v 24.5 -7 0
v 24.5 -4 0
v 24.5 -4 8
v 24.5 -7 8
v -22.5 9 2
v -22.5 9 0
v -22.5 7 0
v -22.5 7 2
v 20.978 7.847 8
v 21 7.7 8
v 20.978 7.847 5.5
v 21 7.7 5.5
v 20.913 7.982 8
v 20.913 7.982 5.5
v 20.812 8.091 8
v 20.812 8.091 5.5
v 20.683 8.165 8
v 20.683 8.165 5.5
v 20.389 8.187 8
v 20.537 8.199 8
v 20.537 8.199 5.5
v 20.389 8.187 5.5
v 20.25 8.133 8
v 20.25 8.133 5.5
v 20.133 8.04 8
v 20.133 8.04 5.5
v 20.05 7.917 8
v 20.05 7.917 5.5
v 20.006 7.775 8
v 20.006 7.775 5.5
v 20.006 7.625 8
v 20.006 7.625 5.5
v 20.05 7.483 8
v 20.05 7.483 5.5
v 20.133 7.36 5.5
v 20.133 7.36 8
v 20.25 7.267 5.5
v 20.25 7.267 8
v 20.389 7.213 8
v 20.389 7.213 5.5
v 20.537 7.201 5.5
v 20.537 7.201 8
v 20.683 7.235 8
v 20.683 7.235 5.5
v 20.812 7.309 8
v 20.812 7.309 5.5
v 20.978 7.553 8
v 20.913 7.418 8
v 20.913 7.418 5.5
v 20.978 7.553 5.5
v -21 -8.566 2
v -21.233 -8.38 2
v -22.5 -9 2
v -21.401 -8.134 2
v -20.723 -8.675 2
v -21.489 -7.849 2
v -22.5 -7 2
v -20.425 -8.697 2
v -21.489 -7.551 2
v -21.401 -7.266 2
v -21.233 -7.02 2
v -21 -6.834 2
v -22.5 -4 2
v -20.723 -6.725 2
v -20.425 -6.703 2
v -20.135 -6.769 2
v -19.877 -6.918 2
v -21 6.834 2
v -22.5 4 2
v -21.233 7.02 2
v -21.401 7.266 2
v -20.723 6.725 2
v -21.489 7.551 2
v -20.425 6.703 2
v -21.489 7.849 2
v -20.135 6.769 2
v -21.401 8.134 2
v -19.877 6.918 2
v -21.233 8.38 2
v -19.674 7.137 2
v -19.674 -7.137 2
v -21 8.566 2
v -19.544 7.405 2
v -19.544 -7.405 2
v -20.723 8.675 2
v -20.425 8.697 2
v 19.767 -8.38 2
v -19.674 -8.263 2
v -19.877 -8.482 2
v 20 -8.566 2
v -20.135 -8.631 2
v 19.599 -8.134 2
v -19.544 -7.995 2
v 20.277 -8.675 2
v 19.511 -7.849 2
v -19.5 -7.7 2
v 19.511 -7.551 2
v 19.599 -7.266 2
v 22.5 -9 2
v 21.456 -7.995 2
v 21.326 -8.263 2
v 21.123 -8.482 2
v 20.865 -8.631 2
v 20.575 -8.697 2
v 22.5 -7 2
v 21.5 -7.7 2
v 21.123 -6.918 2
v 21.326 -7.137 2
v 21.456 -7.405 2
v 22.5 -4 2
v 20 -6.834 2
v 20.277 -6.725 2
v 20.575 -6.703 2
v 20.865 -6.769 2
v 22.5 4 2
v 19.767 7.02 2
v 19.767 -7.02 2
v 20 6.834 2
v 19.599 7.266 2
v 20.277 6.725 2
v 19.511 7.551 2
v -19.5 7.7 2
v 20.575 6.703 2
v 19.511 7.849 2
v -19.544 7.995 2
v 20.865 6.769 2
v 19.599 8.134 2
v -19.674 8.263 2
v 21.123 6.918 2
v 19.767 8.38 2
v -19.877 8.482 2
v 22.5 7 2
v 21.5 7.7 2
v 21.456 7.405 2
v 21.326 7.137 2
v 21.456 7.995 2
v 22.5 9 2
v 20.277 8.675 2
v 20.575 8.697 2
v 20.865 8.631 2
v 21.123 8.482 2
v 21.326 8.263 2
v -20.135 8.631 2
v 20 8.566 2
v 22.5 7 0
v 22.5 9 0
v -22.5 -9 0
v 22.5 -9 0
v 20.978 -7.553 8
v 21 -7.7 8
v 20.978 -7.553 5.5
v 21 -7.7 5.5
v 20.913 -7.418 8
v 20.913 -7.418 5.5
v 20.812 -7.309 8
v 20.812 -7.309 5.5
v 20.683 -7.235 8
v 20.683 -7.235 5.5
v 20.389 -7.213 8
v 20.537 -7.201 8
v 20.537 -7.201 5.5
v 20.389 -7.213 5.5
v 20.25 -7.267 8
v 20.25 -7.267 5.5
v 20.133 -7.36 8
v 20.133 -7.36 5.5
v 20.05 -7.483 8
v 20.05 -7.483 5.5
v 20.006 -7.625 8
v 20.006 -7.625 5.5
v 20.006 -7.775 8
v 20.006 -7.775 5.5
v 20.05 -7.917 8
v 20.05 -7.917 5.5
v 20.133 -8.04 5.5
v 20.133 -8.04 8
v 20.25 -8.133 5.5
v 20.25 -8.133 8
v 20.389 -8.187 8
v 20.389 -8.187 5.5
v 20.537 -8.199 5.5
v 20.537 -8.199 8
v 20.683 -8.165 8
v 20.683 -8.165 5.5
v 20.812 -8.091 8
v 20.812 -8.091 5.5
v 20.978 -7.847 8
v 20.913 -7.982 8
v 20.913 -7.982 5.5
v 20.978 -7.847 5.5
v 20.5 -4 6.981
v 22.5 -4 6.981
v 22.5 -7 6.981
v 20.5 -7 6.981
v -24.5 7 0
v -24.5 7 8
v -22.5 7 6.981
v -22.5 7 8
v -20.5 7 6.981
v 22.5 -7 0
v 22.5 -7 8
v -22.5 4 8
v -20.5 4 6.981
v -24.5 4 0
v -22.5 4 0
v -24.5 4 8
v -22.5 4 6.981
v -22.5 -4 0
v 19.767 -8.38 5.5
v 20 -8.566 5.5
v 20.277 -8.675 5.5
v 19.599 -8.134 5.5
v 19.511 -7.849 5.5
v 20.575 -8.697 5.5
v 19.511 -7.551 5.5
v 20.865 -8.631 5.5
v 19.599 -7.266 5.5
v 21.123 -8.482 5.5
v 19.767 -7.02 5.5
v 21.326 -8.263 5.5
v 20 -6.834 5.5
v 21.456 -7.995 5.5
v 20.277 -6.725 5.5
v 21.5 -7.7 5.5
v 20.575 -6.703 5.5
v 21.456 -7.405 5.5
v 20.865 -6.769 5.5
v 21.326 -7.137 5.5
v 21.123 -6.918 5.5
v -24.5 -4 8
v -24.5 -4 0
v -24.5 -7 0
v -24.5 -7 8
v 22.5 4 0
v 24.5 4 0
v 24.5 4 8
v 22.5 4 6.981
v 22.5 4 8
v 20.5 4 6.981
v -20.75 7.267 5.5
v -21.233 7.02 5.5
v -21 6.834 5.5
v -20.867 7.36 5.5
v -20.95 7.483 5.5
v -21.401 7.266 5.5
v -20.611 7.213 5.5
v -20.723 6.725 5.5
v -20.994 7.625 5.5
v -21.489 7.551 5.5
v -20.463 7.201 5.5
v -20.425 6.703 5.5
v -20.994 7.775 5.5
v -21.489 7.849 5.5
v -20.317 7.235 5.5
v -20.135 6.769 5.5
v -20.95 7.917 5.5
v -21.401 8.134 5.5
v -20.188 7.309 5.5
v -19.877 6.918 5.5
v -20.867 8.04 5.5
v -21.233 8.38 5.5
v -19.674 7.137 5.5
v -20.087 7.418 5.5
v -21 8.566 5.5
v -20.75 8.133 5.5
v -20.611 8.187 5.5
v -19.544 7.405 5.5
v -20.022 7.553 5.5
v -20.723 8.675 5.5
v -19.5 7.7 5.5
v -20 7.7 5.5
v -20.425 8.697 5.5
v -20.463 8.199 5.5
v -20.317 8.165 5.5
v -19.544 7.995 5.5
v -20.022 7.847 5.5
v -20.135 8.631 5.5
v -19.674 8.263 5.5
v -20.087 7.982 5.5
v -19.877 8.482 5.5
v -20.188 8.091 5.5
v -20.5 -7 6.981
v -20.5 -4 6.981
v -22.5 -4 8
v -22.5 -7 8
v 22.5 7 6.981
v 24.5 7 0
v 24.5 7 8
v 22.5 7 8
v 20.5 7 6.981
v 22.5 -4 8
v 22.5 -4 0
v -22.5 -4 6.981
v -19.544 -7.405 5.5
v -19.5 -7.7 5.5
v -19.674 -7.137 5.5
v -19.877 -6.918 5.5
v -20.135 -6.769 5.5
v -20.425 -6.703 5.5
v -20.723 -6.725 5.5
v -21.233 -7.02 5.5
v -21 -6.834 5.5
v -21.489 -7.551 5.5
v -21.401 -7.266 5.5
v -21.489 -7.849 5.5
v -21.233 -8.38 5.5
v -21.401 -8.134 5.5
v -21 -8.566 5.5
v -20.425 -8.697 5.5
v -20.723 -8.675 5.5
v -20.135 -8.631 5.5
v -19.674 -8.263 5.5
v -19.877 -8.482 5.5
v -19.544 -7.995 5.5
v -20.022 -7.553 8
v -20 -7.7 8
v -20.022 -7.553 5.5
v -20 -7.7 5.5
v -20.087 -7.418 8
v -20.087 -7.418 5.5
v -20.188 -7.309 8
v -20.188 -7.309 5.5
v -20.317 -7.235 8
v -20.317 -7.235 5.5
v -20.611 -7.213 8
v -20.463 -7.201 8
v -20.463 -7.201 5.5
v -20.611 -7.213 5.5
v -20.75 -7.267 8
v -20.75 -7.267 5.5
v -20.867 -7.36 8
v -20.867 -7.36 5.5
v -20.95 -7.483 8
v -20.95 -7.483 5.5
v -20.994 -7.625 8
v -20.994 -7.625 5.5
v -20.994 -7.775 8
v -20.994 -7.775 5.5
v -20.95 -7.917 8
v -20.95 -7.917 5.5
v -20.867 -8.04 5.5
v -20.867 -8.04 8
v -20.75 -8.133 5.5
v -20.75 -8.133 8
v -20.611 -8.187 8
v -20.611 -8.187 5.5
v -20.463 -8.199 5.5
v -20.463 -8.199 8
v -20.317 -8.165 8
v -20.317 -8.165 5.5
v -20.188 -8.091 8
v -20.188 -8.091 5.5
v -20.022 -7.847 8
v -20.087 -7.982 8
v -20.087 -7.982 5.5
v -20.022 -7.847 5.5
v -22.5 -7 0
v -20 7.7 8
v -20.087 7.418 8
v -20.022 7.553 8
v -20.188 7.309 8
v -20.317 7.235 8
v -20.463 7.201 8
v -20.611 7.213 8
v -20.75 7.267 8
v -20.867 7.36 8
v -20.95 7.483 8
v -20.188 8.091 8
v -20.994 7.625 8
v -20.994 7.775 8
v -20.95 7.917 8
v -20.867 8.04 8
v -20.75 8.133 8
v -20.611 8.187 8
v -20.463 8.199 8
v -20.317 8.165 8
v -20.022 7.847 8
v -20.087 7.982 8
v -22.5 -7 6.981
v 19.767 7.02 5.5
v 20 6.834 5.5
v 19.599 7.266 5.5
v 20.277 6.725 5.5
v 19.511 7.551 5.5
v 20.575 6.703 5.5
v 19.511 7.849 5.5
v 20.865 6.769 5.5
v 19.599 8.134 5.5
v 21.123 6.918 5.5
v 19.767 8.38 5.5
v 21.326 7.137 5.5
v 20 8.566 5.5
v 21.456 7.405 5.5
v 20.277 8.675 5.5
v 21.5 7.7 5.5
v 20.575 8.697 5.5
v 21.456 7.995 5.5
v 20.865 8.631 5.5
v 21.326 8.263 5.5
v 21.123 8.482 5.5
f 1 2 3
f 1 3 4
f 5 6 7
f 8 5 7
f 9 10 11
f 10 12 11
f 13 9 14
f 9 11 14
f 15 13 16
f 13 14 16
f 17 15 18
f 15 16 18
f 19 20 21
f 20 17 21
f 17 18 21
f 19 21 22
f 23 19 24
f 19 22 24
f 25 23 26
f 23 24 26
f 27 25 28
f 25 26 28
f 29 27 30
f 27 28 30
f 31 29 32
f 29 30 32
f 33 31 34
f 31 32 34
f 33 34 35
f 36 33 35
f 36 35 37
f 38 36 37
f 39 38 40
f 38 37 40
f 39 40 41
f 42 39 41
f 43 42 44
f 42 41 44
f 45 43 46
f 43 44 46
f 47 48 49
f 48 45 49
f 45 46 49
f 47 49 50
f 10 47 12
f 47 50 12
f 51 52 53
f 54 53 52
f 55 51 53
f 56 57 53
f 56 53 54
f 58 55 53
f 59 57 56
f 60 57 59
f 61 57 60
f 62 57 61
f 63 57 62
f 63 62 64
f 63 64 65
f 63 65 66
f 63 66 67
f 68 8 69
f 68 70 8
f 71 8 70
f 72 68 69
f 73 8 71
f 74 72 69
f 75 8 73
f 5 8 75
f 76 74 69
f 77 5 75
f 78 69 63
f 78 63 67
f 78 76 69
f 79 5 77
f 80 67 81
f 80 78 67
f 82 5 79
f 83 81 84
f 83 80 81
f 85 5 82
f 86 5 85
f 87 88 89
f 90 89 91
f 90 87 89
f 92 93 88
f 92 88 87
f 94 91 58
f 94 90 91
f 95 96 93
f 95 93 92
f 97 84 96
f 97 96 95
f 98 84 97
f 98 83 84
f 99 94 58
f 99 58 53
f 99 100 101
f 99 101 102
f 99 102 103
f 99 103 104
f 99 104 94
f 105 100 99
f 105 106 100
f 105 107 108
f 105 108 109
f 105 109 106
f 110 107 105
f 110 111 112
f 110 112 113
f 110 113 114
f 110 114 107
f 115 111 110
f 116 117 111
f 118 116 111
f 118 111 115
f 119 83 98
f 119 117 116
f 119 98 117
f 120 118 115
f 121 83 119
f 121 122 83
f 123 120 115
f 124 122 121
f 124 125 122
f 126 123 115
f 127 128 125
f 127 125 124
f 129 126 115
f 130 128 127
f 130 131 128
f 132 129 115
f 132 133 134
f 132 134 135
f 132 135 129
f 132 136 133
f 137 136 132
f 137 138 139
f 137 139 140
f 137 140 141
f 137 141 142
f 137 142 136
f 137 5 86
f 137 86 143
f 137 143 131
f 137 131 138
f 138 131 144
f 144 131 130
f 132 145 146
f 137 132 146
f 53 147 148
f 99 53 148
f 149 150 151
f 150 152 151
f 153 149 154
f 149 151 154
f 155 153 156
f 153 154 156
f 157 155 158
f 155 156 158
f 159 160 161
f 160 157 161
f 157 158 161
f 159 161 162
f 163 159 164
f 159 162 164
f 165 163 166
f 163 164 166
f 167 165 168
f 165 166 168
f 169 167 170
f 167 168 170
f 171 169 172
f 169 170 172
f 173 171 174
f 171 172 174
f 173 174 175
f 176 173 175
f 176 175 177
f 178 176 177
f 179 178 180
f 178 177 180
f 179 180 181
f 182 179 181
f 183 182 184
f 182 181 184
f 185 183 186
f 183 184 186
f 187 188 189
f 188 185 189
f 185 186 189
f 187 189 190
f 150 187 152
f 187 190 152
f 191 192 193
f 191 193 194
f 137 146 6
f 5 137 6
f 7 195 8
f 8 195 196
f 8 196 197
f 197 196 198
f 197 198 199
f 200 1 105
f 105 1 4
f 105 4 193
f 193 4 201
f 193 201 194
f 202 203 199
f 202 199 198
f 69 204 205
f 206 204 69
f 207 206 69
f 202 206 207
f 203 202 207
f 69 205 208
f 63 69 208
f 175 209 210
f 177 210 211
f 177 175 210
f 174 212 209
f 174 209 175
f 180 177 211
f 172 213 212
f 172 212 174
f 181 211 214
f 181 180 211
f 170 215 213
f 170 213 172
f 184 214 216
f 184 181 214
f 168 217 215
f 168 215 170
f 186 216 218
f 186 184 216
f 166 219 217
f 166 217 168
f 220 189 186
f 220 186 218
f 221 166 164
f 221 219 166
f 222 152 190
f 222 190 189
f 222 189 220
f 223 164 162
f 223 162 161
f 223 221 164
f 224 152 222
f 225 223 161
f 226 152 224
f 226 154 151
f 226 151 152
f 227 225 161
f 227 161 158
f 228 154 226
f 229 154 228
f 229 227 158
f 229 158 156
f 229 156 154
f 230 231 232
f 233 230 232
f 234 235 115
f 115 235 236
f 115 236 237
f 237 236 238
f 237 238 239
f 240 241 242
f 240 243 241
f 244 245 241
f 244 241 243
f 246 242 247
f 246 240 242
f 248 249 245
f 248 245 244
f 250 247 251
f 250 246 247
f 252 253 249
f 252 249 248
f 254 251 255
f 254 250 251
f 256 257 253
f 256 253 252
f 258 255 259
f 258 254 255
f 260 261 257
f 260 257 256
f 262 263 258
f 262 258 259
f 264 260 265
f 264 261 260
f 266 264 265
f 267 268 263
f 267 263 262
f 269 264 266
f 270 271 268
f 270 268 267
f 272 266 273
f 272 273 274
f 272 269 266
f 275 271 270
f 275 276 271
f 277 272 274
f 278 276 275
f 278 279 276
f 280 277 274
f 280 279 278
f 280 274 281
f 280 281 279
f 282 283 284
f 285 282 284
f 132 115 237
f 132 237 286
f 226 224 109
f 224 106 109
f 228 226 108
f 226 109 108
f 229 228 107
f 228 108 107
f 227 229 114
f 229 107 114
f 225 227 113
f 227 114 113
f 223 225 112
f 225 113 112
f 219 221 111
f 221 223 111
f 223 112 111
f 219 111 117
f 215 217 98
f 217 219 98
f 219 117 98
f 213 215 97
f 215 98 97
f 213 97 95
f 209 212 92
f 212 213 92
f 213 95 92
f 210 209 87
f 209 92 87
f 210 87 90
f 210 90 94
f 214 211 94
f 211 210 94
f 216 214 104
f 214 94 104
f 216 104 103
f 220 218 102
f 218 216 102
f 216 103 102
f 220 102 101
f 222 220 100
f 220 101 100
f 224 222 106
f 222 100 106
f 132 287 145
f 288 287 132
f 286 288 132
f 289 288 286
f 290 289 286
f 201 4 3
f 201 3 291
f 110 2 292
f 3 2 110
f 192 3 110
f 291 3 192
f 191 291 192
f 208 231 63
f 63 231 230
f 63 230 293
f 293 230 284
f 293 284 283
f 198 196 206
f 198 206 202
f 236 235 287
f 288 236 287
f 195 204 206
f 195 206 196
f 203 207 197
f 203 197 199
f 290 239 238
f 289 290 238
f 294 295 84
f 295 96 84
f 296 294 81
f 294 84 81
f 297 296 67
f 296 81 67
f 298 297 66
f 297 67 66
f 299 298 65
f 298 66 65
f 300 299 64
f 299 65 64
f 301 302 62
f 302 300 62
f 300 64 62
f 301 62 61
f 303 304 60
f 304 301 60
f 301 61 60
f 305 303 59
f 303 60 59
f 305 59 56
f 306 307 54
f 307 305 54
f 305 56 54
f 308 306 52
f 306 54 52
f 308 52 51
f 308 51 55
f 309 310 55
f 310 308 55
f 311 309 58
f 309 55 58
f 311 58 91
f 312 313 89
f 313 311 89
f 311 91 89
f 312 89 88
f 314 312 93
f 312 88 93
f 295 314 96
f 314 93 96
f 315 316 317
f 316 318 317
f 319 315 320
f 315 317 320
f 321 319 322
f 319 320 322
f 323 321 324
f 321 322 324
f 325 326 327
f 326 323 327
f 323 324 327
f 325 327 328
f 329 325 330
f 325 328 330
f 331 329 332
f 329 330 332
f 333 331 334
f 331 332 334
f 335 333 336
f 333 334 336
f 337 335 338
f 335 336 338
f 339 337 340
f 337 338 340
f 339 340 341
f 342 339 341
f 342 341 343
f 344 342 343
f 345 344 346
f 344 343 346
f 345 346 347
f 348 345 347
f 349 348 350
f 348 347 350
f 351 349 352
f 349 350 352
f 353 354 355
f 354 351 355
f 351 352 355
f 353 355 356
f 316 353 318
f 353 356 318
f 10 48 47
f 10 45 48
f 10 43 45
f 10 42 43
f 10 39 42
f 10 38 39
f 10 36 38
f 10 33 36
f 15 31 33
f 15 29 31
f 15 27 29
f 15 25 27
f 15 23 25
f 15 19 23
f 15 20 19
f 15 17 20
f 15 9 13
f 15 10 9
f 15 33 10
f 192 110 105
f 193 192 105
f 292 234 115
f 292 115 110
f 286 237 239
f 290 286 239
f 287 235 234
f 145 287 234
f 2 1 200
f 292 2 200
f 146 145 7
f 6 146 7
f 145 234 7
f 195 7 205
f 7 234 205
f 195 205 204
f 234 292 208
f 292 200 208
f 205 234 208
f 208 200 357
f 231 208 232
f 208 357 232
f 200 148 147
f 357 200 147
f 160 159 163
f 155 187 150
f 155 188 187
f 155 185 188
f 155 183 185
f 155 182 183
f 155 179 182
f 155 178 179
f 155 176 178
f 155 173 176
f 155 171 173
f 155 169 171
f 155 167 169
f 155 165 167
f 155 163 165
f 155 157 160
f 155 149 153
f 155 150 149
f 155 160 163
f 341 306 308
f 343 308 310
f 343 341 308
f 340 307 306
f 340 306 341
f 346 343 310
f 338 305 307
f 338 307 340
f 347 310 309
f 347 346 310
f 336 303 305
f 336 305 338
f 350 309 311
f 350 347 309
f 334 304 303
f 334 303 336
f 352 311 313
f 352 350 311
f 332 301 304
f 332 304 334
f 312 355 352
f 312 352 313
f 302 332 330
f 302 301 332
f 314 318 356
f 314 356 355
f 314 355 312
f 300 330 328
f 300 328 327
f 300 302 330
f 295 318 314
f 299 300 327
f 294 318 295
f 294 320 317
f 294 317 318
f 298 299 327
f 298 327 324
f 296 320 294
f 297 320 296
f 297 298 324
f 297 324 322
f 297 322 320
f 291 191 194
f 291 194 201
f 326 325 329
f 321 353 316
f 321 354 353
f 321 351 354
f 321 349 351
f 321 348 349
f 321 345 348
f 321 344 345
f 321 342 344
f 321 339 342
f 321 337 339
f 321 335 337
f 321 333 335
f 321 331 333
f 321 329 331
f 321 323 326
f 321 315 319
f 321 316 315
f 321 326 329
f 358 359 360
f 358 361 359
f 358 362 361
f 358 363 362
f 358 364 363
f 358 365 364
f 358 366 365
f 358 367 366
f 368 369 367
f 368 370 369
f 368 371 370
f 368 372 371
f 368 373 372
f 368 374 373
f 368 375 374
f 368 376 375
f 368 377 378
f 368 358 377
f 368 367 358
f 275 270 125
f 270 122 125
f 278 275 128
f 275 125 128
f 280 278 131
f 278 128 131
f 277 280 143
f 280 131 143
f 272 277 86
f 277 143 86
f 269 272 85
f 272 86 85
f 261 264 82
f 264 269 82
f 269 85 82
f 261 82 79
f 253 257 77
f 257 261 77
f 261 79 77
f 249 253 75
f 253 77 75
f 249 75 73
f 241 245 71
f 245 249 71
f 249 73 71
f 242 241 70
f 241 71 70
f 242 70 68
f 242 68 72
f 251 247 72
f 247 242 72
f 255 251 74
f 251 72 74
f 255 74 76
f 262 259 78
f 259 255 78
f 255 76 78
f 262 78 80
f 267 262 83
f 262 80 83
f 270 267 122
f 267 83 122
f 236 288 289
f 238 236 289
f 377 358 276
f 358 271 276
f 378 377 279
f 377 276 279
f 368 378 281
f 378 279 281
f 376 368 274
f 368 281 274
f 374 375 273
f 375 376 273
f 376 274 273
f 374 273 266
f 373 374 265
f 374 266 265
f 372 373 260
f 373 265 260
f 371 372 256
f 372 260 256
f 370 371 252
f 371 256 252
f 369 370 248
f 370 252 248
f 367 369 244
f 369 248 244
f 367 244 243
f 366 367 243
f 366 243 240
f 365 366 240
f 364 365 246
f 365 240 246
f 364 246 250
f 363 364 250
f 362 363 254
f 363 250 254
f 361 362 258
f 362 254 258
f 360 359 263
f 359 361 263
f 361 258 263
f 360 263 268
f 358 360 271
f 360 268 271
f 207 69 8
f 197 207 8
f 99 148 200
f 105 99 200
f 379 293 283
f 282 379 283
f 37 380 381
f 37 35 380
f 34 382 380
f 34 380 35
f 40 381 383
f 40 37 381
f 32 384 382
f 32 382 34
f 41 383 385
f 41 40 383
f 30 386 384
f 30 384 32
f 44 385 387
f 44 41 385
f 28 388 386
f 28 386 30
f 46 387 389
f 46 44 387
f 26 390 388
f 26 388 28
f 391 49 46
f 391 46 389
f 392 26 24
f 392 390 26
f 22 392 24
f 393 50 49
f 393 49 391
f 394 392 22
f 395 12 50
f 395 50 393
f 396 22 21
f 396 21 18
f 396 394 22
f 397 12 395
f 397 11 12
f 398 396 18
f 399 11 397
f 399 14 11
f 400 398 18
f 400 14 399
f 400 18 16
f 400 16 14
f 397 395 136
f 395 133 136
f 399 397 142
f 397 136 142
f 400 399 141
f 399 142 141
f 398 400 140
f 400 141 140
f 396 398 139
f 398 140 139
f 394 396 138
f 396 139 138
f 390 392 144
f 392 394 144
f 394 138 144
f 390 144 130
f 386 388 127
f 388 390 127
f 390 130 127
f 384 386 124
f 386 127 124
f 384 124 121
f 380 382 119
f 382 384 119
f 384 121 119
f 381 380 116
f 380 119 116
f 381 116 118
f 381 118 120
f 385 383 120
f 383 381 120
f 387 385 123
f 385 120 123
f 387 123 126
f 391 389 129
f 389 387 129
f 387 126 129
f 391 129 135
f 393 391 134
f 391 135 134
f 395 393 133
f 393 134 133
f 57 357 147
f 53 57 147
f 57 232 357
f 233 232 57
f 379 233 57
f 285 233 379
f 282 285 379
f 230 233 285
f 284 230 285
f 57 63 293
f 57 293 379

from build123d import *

# Parameters (mm, degrees)
F0_R     = 1
F0_R_2   = 0.5
F1_DEPTH = 2
F2_DEPTH = 5.5
F3_DEPTH = 8
F0_W     = 2
F0_H     = 3
F4_DEPTH = 8
F6_DEPTH = 3


# Not quite as in the source:
# - a feature names something its author has since deleted; it is built from what else it names


with BuildPart() as f1:
    # F0 (on Top) → F1 (new body)
    with BuildSketch(Plane.XY):
        Polygon((22.5, 9), (-22.5, 9), (-22.5, 7), (-22.5, 4), (-22.5, -4), (-22.5, -7), (-22.5, -9), (22.5, -9), (22.5, -7), (22.5, -4), (22.5, 4), (22.5, 7), align=None)
        with Locations((-20.5, -7.7)):
            Circle(F0_R, mode=Mode.SUBTRACT)
        with Locations((20.5, -7.7)):
            Circle(F0_R, mode=Mode.SUBTRACT)
        with Locations((-20.5, 7.7)):
            Circle(F0_R, mode=Mode.SUBTRACT)
        with Locations((20.5, 7.7)):
            Circle(F0_R, mode=Mode.SUBTRACT)
        with Locations((-20.5, 7.7)):
            Circle(F0_R)
        with Locations((-20.5, 7.7)):
            Circle(F0_R_2, mode=Mode.SUBTRACT)
        with Locations((20.5, 7.7)):
            Circle(F0_R)
        with Locations((20.5, 7.7)):
            Circle(F0_R_2, mode=Mode.SUBTRACT)
        with Locations((20.5, -7.7)):
            Circle(F0_R)
        with Locations((20.5, -7.7)):
            Circle(F0_R_2, mode=Mode.SUBTRACT)
        with Locations((-20.5, -7.7)):
            Circle(F0_R)
        with Locations((-20.5, -7.7)):
            Circle(F0_R_2, mode=Mode.SUBTRACT)
        with Locations((-20.5, 7.7)):
            Circle(F0_R_2)
        with Locations((20.5, 7.7)):
            Circle(F0_R_2)
        with Locations((20.5, -7.7)):
            Circle(F0_R_2)
        with Locations((-20.5, -7.7)):
            Circle(F0_R_2)
    extrude(amount=F1_DEPTH)

    # F0 (on Top) → F2 (join)
    with BuildSketch(Plane.XY):
        with Locations((-20.5, 7.7)):
            Circle(F0_R)
        with Locations((-20.5, 7.7)):
            Circle(F0_R_2, mode=Mode.SUBTRACT)
        with Locations((-20.5, 7.7)):
            Circle(F0_R_2)
        with Locations((-20.5, -7.7)):
            Circle(F0_R)
        with Locations((-20.5, -7.7)):
            Circle(F0_R_2, mode=Mode.SUBTRACT)
        with Locations((-20.5, -7.7)):
            Circle(F0_R_2)
        with Locations((20.5, 7.7)):
            Circle(F0_R)
        with Locations((20.5, 7.7)):
            Circle(F0_R_2, mode=Mode.SUBTRACT)
        with Locations((20.5, 7.7)):
            Circle(F0_R_2)
        with Locations((20.5, -7.7)):
            Circle(F0_R)
        with Locations((20.5, -7.7)):
            Circle(F0_R_2, mode=Mode.SUBTRACT)
        with Locations((20.5, -7.7)):
            Circle(F0_R_2)
    extrude(amount=F2_DEPTH)

    # F0 (on Top) → F3 (join)
    with BuildSketch(Plane.XY):
        with Locations((-20.5, 7.7)):
            Circle(F0_R_2)
        with Locations((20.5, 7.7)):
            Circle(F0_R_2)
        with Locations((20.5, -7.7)):
            Circle(F0_R_2)
        with Locations((-20.5, -7.7)):
            Circle(F0_R_2)
    extrude(amount=F3_DEPTH)

    # F0 (on Top) → F4 (join)
    with BuildSketch(Plane.XY):
        with Locations((-23.5, 5.5)):
            Rectangle(F0_W, F0_H)
    extrude(amount=F4_DEPTH)

    # F5 (on face) → F6 (join, through all)
    with BuildSketch(Plane.XZ.offset(-4)):
        Polygon((-22.5, 8), (-22.5, 6.980669219), (-20.5, 6.980669219), align=None)
    extrude(amount=-F6_DEPTH)

    # F7: F1 across plane


with BuildPart() as f1_1:
    add(f1.part)
    add(f1.part.mirror(Plane.XZ))

    # F8: F1 across plane


with BuildPart() as f1_2:
    add(f1_1.part)
    add(f1_1.part.mirror(Plane.YZ))


solid = f1_2.part
